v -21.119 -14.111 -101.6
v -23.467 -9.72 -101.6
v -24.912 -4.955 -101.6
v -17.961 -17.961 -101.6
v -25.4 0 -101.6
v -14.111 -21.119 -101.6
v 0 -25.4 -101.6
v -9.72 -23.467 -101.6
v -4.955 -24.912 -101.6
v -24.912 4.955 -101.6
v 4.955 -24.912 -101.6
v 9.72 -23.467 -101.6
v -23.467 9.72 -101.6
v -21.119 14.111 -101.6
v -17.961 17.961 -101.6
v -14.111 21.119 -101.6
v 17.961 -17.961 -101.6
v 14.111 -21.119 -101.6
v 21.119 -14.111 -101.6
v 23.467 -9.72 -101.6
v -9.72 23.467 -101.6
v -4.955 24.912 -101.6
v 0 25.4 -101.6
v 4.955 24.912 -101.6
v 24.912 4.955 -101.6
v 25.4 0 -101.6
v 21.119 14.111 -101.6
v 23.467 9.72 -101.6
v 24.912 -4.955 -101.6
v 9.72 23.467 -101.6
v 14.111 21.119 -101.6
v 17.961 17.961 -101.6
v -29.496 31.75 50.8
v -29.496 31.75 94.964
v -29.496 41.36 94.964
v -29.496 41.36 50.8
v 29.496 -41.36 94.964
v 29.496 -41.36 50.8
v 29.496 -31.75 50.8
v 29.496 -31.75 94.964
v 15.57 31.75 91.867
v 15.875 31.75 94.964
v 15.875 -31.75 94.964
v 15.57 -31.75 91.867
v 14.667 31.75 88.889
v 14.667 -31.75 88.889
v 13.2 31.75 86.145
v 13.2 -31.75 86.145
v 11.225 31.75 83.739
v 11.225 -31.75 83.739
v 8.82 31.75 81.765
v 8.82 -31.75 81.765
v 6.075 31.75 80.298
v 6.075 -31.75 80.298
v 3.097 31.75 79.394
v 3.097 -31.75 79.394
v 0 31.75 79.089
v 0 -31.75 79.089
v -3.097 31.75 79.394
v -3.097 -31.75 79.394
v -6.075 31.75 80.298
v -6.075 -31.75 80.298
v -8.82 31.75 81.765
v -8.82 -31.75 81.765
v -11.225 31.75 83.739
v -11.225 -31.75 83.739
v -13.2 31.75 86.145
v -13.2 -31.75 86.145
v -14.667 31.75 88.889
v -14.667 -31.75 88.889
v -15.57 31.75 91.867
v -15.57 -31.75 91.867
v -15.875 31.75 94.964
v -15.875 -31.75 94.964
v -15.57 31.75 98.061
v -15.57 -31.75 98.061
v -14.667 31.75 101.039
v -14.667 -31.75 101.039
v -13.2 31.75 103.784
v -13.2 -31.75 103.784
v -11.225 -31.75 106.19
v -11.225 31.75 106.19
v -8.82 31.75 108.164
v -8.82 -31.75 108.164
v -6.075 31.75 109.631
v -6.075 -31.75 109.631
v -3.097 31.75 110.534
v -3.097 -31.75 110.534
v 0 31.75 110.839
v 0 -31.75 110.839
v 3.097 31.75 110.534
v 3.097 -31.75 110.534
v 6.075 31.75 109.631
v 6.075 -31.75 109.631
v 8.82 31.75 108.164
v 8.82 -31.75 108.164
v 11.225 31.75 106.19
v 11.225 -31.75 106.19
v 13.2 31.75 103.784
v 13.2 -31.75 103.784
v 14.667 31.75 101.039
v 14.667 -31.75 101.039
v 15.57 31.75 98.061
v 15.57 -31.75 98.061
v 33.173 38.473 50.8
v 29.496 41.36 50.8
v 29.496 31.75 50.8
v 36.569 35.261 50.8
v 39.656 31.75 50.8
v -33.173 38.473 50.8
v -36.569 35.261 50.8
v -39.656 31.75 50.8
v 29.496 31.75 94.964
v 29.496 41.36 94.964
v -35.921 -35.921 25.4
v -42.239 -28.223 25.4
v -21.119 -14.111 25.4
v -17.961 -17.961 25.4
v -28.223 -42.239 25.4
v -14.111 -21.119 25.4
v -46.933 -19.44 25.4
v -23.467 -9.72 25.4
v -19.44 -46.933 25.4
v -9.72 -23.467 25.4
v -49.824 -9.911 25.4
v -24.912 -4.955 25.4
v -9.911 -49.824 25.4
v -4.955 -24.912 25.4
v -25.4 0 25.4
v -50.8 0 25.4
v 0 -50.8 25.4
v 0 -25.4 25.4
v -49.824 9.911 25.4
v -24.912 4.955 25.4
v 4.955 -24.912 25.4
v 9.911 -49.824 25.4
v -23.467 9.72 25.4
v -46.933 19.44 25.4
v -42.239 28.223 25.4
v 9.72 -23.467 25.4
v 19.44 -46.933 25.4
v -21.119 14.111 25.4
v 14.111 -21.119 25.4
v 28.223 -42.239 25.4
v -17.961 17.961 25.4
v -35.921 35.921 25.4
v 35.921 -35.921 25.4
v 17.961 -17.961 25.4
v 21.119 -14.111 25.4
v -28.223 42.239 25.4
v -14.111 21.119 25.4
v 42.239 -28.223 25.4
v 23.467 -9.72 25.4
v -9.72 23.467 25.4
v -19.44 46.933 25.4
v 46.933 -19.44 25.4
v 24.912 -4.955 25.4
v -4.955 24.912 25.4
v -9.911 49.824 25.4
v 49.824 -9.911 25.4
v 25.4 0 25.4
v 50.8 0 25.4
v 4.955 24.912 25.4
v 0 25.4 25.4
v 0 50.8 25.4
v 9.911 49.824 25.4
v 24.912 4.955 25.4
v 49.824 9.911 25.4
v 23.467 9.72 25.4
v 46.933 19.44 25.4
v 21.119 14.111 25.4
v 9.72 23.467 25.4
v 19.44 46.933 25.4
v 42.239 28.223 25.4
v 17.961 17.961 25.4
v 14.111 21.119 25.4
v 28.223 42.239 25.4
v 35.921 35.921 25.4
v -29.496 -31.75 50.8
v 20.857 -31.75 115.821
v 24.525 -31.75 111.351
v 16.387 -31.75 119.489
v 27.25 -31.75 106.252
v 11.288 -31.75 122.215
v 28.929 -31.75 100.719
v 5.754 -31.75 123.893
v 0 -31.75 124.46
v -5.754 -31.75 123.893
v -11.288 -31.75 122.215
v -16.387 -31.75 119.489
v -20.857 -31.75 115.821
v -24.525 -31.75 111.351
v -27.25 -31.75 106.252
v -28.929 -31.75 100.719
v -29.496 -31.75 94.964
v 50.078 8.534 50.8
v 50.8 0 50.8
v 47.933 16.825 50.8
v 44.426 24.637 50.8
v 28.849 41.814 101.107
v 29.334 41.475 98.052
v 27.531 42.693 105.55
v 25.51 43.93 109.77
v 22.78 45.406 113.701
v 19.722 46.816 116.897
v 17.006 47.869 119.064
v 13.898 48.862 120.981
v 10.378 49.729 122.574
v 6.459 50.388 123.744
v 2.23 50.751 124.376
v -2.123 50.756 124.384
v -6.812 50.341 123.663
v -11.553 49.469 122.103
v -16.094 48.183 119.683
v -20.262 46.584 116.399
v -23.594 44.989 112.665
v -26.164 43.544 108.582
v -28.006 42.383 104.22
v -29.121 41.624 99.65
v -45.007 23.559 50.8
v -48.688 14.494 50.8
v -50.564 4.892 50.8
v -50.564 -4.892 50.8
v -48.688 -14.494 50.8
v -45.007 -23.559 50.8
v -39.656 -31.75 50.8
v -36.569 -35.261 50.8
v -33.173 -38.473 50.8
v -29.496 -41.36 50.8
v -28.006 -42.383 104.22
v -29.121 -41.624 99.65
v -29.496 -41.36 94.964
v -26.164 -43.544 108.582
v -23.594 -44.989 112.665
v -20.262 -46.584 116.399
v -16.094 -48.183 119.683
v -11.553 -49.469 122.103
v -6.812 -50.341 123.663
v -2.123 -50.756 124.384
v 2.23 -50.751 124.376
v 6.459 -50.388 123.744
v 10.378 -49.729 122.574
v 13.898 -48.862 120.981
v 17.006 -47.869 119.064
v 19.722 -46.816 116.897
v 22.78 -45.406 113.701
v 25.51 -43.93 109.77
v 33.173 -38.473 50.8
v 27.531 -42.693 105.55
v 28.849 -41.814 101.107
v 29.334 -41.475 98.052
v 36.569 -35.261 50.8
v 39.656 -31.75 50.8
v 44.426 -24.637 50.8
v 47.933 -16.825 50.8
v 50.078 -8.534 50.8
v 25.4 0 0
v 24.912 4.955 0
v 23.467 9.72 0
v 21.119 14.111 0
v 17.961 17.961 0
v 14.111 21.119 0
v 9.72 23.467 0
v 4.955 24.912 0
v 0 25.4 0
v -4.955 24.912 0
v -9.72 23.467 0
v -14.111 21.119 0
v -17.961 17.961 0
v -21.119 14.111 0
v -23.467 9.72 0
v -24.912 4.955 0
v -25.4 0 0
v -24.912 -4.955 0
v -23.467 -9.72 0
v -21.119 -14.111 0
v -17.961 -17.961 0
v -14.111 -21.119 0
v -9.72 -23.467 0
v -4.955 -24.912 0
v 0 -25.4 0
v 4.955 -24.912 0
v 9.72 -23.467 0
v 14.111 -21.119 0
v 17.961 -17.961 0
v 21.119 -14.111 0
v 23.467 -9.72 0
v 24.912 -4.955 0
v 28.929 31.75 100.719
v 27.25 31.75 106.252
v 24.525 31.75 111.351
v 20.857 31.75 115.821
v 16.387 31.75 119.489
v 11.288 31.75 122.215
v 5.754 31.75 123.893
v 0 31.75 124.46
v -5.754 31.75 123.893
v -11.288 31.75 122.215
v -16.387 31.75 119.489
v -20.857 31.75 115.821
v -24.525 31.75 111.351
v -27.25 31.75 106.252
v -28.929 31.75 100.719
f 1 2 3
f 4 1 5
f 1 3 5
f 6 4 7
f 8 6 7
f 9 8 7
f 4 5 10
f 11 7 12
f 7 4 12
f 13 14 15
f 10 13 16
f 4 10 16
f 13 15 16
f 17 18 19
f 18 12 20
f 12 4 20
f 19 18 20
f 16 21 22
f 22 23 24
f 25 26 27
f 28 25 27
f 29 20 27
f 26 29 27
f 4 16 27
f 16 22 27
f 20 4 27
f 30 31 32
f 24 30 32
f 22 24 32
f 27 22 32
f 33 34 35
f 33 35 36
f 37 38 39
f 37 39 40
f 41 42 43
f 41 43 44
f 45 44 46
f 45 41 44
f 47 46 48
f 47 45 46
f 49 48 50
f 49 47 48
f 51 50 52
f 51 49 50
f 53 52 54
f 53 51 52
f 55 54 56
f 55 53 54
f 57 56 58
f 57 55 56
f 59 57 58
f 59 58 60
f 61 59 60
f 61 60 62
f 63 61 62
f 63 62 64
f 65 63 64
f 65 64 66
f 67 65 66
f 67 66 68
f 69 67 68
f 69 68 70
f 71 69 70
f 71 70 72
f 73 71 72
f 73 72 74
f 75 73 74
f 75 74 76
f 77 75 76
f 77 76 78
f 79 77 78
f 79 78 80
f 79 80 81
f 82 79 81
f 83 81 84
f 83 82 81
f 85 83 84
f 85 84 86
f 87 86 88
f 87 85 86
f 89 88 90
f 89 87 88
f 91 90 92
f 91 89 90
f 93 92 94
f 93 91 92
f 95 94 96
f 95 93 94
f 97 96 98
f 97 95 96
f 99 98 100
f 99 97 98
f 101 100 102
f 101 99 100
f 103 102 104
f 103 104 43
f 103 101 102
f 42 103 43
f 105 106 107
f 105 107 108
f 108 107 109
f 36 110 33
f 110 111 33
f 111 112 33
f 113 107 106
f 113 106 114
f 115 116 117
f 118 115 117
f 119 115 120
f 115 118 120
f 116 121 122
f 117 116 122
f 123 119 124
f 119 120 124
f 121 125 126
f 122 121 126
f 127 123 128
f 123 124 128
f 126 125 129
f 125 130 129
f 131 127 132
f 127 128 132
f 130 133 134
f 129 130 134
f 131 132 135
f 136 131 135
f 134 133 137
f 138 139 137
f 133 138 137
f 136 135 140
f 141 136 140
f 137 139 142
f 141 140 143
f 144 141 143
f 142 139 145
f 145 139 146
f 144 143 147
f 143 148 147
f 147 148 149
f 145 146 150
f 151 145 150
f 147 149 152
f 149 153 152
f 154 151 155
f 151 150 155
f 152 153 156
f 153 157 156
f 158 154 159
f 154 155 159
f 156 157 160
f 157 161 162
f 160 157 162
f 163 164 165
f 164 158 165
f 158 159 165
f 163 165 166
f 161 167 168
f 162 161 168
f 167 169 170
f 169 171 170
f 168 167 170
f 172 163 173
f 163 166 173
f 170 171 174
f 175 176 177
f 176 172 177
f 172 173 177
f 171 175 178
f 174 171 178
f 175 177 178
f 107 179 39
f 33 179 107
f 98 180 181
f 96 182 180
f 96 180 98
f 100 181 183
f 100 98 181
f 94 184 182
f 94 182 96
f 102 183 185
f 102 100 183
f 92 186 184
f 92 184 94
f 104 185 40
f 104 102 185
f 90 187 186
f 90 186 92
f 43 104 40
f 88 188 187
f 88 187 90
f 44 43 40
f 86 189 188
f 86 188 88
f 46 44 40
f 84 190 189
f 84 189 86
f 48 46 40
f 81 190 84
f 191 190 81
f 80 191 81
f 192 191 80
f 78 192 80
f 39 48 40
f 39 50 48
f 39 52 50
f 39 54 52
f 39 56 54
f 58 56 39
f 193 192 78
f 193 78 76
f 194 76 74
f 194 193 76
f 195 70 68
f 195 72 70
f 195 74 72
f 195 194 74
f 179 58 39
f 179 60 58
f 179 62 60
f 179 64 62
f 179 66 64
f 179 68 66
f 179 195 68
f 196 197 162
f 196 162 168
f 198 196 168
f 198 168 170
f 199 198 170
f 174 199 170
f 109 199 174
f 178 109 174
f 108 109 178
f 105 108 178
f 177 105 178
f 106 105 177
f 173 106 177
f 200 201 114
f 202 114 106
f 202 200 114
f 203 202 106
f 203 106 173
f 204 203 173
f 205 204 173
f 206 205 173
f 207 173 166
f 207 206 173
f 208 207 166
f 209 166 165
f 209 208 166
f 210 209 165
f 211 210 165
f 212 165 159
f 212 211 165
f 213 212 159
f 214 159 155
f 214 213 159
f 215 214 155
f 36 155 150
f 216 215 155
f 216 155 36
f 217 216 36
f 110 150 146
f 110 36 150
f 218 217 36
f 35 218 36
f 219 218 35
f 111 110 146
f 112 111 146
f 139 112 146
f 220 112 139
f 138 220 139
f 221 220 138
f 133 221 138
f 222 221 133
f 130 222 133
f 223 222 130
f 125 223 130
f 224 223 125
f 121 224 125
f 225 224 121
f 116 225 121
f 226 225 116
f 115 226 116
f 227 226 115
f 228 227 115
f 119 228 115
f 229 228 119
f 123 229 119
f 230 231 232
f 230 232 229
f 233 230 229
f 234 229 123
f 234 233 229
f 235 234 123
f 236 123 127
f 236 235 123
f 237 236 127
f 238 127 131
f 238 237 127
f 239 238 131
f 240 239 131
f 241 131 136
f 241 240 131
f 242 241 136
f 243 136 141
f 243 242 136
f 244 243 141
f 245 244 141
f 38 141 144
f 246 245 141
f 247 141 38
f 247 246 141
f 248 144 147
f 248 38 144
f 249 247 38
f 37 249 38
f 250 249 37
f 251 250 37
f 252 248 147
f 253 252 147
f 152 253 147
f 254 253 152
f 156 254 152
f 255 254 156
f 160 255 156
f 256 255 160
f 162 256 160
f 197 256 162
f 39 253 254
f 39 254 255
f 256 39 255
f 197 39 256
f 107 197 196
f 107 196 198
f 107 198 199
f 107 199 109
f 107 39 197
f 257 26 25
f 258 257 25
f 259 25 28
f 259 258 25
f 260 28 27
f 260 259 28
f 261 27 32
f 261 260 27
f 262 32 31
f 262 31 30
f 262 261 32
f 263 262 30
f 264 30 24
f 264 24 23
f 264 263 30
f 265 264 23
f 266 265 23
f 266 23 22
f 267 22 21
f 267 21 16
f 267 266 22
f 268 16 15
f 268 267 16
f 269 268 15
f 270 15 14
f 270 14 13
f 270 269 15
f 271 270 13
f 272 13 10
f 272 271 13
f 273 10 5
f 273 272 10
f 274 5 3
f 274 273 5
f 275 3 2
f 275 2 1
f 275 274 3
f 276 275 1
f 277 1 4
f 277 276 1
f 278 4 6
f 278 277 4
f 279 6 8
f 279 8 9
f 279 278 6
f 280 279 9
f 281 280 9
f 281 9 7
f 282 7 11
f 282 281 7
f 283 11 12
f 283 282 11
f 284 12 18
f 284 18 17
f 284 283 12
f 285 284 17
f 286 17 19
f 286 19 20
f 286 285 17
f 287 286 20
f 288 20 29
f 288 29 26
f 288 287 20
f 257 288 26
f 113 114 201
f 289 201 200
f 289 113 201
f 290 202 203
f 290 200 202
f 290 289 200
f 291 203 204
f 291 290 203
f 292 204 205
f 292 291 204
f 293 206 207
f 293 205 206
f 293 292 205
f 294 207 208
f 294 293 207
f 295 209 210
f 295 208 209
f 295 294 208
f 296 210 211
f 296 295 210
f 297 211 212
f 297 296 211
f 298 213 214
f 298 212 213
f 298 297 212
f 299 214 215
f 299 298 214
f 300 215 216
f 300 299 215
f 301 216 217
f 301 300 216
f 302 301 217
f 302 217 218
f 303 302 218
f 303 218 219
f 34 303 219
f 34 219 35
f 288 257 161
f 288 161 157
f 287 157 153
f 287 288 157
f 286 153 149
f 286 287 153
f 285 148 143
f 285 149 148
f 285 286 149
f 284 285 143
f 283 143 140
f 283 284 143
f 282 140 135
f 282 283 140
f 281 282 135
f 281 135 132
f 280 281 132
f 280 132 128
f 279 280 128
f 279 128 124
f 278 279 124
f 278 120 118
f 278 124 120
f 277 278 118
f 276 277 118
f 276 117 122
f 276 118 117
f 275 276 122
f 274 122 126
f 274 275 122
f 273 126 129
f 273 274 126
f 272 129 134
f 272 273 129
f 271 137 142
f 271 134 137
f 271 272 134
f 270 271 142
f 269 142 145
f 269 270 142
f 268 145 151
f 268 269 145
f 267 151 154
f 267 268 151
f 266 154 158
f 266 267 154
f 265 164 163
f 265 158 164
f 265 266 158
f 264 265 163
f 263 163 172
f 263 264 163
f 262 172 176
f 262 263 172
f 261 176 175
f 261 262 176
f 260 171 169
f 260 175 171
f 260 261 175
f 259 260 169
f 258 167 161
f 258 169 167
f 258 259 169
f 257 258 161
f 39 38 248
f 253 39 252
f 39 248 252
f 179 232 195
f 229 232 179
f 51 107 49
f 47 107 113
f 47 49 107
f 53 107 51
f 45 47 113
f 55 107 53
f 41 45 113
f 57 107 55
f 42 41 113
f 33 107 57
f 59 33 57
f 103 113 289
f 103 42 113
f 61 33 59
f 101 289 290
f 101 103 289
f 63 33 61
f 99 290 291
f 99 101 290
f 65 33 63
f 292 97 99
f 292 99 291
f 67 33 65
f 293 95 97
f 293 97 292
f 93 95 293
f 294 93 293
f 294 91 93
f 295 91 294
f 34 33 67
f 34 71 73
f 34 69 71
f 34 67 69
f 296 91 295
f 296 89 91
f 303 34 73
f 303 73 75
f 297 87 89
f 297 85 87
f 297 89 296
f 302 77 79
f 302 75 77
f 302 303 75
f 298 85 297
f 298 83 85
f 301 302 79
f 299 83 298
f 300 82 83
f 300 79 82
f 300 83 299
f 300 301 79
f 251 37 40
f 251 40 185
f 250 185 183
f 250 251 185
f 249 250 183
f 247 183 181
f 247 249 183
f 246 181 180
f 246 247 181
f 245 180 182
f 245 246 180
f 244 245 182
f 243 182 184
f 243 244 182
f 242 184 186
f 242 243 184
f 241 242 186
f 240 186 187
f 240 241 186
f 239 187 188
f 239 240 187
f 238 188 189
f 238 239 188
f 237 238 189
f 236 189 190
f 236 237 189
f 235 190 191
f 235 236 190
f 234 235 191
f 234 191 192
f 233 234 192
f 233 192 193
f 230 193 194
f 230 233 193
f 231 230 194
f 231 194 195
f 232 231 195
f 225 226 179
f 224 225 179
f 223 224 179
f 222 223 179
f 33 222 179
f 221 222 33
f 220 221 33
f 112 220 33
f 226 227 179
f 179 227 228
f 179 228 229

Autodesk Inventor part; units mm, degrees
ref_plane "YZ Plane" through (0, 0, 0) normal (1, 0, 0) x (0, 1, 0)
ref_plane "XZ Plane" through (0, 0, 0) normal (0, 1, 0) x (-1, 0, 0)
ref_plane "XY Plane" through (0, 0, 0) normal (0, 0, 1) x (1, 0, 0)
sketch "Sketch1" plane through (0, 0, 0) normal (0, 0, 1) x (1, 0, 0)
  circle A0 centre (0, 0) radius 25.4
  dimension "d0" = 50.8
extrude "Extrusion1" add sketch "Sketch1" along normal blind 25.4 and the other way blind 101.6
sketch "Sketch2" plane through (0, 0, 0) normal (0, 1, 0) x (-1, 0, 0)
  line L0 (0, -25.4) -> (0, 152.4) construction
  line L1 (25.4, 25.4) -> (-25.4, 25.4) construction
  line L2 (0, 25.4) -> (-50.8, 25.4)
  line L3 (-50.8, 25.4) -> (-50.8, 127)
  line L4 (-50.8, 127) -> (0, 127)
  line L5 (0, 127) -> (0, 25.4)
  point P0 (0, 0)
  dimension "d8" = 50.8
  dimension "d9" = 101.6
revolve "Revolution1" add sketch "Sketch2" angle 360 about axis through (0, 0, -10) along (0, 0, 1)
sketch "Sketch3" plane through (0, 0, 0) normal (1, 0, 0) x (0, 1, 0)
  line L0 (50.8, 127) -> (-50.8, 127) construction
  line L1 (31.75, 127) -> (-31.75, 127)
  line L2 (-31.75, 127) -> (-31.75, 50.8)
  line L3 (-31.75, 50.8) -> (31.75, 50.8)
  line L4 (31.75, 50.8) -> (31.75, 127)
  line L5 (0, -25.4) -> (0, 152.4) construction
  point P0 (0, 0)
  point P1 (0, 50.8)
  dimension "d11" = 0
  dimension "d12" = 76.2
  dimension "d13" = 63.5
extrude "Extrusion2" cut sketch "Sketch3" along normal mid plane 254
sketch "Sketch4" plane through (0, 0, 0) normal (0, 1, 0) x (-1, 0, 0)
  line L0 (-39.6557, 127) -> (39.6557, 127) construction
  line L1 (39.6557, 127) -> (39.6557, 50.8) construction
  line L2 (-39.6557, 50.8) -> (-39.6557, 127) construction
  line L3 (-29.4957, 50.8) -> (-29.4957, 94.9643)
  line L4 (39.6557, 50.8) -> (-39.6557, 50.8) construction
  line L5 (29.4957, 94.9643) -> (29.4957, 50.8)
  arc A0 (29.4957, 94.9643) -> (-29.4957, 94.9643) centre (0, 94.9643) ccw
  line L6 (-29.4957, 50.8) -> (-112.68, 50.8)
  line L7 (-112.68, 50.8) -> (-112.68, 137.8838)
  line L8 (-112.68, 137.8838) -> (83.0957, 137.8838)
  line L9 (83.0957, 137.8838) -> (83.0957, 50.8)
  line L10 (83.0957, 50.8) -> (29.4957, 50.8)
  line L11 (39.6557, 127) -> (-39.6557, 127) construction
  point P0 (0, 0)
  point P1 (0, 124.46)
  point P2 (0, 127)
  point P3 (0, 127)
  dimension "d16" = 10.16
  dimension "d17" = 10.16
  dimension "d24" = 2.54
extrude "Extrusion3" cut sketch "Sketch4" along normal mid plane 254
sketch "Sketch5" plane through (0, 31.75, 94.9643) normal (0, -1, 0) x (1, 0, 0)
  circle A0 centre (0, 0) radius 15.875
  line L0 (29.4957, 0) -> (29.4957, -44.1643) construction
  line L1 (-29.4957, 0) -> (29.4957, 0) construction
  point P0 (0, -94.9643)
  dimension "d21" = 31.75
extrude "Extrusion4" add sketch "Sketch5" along normal up to next
properties part number "u_joint"
